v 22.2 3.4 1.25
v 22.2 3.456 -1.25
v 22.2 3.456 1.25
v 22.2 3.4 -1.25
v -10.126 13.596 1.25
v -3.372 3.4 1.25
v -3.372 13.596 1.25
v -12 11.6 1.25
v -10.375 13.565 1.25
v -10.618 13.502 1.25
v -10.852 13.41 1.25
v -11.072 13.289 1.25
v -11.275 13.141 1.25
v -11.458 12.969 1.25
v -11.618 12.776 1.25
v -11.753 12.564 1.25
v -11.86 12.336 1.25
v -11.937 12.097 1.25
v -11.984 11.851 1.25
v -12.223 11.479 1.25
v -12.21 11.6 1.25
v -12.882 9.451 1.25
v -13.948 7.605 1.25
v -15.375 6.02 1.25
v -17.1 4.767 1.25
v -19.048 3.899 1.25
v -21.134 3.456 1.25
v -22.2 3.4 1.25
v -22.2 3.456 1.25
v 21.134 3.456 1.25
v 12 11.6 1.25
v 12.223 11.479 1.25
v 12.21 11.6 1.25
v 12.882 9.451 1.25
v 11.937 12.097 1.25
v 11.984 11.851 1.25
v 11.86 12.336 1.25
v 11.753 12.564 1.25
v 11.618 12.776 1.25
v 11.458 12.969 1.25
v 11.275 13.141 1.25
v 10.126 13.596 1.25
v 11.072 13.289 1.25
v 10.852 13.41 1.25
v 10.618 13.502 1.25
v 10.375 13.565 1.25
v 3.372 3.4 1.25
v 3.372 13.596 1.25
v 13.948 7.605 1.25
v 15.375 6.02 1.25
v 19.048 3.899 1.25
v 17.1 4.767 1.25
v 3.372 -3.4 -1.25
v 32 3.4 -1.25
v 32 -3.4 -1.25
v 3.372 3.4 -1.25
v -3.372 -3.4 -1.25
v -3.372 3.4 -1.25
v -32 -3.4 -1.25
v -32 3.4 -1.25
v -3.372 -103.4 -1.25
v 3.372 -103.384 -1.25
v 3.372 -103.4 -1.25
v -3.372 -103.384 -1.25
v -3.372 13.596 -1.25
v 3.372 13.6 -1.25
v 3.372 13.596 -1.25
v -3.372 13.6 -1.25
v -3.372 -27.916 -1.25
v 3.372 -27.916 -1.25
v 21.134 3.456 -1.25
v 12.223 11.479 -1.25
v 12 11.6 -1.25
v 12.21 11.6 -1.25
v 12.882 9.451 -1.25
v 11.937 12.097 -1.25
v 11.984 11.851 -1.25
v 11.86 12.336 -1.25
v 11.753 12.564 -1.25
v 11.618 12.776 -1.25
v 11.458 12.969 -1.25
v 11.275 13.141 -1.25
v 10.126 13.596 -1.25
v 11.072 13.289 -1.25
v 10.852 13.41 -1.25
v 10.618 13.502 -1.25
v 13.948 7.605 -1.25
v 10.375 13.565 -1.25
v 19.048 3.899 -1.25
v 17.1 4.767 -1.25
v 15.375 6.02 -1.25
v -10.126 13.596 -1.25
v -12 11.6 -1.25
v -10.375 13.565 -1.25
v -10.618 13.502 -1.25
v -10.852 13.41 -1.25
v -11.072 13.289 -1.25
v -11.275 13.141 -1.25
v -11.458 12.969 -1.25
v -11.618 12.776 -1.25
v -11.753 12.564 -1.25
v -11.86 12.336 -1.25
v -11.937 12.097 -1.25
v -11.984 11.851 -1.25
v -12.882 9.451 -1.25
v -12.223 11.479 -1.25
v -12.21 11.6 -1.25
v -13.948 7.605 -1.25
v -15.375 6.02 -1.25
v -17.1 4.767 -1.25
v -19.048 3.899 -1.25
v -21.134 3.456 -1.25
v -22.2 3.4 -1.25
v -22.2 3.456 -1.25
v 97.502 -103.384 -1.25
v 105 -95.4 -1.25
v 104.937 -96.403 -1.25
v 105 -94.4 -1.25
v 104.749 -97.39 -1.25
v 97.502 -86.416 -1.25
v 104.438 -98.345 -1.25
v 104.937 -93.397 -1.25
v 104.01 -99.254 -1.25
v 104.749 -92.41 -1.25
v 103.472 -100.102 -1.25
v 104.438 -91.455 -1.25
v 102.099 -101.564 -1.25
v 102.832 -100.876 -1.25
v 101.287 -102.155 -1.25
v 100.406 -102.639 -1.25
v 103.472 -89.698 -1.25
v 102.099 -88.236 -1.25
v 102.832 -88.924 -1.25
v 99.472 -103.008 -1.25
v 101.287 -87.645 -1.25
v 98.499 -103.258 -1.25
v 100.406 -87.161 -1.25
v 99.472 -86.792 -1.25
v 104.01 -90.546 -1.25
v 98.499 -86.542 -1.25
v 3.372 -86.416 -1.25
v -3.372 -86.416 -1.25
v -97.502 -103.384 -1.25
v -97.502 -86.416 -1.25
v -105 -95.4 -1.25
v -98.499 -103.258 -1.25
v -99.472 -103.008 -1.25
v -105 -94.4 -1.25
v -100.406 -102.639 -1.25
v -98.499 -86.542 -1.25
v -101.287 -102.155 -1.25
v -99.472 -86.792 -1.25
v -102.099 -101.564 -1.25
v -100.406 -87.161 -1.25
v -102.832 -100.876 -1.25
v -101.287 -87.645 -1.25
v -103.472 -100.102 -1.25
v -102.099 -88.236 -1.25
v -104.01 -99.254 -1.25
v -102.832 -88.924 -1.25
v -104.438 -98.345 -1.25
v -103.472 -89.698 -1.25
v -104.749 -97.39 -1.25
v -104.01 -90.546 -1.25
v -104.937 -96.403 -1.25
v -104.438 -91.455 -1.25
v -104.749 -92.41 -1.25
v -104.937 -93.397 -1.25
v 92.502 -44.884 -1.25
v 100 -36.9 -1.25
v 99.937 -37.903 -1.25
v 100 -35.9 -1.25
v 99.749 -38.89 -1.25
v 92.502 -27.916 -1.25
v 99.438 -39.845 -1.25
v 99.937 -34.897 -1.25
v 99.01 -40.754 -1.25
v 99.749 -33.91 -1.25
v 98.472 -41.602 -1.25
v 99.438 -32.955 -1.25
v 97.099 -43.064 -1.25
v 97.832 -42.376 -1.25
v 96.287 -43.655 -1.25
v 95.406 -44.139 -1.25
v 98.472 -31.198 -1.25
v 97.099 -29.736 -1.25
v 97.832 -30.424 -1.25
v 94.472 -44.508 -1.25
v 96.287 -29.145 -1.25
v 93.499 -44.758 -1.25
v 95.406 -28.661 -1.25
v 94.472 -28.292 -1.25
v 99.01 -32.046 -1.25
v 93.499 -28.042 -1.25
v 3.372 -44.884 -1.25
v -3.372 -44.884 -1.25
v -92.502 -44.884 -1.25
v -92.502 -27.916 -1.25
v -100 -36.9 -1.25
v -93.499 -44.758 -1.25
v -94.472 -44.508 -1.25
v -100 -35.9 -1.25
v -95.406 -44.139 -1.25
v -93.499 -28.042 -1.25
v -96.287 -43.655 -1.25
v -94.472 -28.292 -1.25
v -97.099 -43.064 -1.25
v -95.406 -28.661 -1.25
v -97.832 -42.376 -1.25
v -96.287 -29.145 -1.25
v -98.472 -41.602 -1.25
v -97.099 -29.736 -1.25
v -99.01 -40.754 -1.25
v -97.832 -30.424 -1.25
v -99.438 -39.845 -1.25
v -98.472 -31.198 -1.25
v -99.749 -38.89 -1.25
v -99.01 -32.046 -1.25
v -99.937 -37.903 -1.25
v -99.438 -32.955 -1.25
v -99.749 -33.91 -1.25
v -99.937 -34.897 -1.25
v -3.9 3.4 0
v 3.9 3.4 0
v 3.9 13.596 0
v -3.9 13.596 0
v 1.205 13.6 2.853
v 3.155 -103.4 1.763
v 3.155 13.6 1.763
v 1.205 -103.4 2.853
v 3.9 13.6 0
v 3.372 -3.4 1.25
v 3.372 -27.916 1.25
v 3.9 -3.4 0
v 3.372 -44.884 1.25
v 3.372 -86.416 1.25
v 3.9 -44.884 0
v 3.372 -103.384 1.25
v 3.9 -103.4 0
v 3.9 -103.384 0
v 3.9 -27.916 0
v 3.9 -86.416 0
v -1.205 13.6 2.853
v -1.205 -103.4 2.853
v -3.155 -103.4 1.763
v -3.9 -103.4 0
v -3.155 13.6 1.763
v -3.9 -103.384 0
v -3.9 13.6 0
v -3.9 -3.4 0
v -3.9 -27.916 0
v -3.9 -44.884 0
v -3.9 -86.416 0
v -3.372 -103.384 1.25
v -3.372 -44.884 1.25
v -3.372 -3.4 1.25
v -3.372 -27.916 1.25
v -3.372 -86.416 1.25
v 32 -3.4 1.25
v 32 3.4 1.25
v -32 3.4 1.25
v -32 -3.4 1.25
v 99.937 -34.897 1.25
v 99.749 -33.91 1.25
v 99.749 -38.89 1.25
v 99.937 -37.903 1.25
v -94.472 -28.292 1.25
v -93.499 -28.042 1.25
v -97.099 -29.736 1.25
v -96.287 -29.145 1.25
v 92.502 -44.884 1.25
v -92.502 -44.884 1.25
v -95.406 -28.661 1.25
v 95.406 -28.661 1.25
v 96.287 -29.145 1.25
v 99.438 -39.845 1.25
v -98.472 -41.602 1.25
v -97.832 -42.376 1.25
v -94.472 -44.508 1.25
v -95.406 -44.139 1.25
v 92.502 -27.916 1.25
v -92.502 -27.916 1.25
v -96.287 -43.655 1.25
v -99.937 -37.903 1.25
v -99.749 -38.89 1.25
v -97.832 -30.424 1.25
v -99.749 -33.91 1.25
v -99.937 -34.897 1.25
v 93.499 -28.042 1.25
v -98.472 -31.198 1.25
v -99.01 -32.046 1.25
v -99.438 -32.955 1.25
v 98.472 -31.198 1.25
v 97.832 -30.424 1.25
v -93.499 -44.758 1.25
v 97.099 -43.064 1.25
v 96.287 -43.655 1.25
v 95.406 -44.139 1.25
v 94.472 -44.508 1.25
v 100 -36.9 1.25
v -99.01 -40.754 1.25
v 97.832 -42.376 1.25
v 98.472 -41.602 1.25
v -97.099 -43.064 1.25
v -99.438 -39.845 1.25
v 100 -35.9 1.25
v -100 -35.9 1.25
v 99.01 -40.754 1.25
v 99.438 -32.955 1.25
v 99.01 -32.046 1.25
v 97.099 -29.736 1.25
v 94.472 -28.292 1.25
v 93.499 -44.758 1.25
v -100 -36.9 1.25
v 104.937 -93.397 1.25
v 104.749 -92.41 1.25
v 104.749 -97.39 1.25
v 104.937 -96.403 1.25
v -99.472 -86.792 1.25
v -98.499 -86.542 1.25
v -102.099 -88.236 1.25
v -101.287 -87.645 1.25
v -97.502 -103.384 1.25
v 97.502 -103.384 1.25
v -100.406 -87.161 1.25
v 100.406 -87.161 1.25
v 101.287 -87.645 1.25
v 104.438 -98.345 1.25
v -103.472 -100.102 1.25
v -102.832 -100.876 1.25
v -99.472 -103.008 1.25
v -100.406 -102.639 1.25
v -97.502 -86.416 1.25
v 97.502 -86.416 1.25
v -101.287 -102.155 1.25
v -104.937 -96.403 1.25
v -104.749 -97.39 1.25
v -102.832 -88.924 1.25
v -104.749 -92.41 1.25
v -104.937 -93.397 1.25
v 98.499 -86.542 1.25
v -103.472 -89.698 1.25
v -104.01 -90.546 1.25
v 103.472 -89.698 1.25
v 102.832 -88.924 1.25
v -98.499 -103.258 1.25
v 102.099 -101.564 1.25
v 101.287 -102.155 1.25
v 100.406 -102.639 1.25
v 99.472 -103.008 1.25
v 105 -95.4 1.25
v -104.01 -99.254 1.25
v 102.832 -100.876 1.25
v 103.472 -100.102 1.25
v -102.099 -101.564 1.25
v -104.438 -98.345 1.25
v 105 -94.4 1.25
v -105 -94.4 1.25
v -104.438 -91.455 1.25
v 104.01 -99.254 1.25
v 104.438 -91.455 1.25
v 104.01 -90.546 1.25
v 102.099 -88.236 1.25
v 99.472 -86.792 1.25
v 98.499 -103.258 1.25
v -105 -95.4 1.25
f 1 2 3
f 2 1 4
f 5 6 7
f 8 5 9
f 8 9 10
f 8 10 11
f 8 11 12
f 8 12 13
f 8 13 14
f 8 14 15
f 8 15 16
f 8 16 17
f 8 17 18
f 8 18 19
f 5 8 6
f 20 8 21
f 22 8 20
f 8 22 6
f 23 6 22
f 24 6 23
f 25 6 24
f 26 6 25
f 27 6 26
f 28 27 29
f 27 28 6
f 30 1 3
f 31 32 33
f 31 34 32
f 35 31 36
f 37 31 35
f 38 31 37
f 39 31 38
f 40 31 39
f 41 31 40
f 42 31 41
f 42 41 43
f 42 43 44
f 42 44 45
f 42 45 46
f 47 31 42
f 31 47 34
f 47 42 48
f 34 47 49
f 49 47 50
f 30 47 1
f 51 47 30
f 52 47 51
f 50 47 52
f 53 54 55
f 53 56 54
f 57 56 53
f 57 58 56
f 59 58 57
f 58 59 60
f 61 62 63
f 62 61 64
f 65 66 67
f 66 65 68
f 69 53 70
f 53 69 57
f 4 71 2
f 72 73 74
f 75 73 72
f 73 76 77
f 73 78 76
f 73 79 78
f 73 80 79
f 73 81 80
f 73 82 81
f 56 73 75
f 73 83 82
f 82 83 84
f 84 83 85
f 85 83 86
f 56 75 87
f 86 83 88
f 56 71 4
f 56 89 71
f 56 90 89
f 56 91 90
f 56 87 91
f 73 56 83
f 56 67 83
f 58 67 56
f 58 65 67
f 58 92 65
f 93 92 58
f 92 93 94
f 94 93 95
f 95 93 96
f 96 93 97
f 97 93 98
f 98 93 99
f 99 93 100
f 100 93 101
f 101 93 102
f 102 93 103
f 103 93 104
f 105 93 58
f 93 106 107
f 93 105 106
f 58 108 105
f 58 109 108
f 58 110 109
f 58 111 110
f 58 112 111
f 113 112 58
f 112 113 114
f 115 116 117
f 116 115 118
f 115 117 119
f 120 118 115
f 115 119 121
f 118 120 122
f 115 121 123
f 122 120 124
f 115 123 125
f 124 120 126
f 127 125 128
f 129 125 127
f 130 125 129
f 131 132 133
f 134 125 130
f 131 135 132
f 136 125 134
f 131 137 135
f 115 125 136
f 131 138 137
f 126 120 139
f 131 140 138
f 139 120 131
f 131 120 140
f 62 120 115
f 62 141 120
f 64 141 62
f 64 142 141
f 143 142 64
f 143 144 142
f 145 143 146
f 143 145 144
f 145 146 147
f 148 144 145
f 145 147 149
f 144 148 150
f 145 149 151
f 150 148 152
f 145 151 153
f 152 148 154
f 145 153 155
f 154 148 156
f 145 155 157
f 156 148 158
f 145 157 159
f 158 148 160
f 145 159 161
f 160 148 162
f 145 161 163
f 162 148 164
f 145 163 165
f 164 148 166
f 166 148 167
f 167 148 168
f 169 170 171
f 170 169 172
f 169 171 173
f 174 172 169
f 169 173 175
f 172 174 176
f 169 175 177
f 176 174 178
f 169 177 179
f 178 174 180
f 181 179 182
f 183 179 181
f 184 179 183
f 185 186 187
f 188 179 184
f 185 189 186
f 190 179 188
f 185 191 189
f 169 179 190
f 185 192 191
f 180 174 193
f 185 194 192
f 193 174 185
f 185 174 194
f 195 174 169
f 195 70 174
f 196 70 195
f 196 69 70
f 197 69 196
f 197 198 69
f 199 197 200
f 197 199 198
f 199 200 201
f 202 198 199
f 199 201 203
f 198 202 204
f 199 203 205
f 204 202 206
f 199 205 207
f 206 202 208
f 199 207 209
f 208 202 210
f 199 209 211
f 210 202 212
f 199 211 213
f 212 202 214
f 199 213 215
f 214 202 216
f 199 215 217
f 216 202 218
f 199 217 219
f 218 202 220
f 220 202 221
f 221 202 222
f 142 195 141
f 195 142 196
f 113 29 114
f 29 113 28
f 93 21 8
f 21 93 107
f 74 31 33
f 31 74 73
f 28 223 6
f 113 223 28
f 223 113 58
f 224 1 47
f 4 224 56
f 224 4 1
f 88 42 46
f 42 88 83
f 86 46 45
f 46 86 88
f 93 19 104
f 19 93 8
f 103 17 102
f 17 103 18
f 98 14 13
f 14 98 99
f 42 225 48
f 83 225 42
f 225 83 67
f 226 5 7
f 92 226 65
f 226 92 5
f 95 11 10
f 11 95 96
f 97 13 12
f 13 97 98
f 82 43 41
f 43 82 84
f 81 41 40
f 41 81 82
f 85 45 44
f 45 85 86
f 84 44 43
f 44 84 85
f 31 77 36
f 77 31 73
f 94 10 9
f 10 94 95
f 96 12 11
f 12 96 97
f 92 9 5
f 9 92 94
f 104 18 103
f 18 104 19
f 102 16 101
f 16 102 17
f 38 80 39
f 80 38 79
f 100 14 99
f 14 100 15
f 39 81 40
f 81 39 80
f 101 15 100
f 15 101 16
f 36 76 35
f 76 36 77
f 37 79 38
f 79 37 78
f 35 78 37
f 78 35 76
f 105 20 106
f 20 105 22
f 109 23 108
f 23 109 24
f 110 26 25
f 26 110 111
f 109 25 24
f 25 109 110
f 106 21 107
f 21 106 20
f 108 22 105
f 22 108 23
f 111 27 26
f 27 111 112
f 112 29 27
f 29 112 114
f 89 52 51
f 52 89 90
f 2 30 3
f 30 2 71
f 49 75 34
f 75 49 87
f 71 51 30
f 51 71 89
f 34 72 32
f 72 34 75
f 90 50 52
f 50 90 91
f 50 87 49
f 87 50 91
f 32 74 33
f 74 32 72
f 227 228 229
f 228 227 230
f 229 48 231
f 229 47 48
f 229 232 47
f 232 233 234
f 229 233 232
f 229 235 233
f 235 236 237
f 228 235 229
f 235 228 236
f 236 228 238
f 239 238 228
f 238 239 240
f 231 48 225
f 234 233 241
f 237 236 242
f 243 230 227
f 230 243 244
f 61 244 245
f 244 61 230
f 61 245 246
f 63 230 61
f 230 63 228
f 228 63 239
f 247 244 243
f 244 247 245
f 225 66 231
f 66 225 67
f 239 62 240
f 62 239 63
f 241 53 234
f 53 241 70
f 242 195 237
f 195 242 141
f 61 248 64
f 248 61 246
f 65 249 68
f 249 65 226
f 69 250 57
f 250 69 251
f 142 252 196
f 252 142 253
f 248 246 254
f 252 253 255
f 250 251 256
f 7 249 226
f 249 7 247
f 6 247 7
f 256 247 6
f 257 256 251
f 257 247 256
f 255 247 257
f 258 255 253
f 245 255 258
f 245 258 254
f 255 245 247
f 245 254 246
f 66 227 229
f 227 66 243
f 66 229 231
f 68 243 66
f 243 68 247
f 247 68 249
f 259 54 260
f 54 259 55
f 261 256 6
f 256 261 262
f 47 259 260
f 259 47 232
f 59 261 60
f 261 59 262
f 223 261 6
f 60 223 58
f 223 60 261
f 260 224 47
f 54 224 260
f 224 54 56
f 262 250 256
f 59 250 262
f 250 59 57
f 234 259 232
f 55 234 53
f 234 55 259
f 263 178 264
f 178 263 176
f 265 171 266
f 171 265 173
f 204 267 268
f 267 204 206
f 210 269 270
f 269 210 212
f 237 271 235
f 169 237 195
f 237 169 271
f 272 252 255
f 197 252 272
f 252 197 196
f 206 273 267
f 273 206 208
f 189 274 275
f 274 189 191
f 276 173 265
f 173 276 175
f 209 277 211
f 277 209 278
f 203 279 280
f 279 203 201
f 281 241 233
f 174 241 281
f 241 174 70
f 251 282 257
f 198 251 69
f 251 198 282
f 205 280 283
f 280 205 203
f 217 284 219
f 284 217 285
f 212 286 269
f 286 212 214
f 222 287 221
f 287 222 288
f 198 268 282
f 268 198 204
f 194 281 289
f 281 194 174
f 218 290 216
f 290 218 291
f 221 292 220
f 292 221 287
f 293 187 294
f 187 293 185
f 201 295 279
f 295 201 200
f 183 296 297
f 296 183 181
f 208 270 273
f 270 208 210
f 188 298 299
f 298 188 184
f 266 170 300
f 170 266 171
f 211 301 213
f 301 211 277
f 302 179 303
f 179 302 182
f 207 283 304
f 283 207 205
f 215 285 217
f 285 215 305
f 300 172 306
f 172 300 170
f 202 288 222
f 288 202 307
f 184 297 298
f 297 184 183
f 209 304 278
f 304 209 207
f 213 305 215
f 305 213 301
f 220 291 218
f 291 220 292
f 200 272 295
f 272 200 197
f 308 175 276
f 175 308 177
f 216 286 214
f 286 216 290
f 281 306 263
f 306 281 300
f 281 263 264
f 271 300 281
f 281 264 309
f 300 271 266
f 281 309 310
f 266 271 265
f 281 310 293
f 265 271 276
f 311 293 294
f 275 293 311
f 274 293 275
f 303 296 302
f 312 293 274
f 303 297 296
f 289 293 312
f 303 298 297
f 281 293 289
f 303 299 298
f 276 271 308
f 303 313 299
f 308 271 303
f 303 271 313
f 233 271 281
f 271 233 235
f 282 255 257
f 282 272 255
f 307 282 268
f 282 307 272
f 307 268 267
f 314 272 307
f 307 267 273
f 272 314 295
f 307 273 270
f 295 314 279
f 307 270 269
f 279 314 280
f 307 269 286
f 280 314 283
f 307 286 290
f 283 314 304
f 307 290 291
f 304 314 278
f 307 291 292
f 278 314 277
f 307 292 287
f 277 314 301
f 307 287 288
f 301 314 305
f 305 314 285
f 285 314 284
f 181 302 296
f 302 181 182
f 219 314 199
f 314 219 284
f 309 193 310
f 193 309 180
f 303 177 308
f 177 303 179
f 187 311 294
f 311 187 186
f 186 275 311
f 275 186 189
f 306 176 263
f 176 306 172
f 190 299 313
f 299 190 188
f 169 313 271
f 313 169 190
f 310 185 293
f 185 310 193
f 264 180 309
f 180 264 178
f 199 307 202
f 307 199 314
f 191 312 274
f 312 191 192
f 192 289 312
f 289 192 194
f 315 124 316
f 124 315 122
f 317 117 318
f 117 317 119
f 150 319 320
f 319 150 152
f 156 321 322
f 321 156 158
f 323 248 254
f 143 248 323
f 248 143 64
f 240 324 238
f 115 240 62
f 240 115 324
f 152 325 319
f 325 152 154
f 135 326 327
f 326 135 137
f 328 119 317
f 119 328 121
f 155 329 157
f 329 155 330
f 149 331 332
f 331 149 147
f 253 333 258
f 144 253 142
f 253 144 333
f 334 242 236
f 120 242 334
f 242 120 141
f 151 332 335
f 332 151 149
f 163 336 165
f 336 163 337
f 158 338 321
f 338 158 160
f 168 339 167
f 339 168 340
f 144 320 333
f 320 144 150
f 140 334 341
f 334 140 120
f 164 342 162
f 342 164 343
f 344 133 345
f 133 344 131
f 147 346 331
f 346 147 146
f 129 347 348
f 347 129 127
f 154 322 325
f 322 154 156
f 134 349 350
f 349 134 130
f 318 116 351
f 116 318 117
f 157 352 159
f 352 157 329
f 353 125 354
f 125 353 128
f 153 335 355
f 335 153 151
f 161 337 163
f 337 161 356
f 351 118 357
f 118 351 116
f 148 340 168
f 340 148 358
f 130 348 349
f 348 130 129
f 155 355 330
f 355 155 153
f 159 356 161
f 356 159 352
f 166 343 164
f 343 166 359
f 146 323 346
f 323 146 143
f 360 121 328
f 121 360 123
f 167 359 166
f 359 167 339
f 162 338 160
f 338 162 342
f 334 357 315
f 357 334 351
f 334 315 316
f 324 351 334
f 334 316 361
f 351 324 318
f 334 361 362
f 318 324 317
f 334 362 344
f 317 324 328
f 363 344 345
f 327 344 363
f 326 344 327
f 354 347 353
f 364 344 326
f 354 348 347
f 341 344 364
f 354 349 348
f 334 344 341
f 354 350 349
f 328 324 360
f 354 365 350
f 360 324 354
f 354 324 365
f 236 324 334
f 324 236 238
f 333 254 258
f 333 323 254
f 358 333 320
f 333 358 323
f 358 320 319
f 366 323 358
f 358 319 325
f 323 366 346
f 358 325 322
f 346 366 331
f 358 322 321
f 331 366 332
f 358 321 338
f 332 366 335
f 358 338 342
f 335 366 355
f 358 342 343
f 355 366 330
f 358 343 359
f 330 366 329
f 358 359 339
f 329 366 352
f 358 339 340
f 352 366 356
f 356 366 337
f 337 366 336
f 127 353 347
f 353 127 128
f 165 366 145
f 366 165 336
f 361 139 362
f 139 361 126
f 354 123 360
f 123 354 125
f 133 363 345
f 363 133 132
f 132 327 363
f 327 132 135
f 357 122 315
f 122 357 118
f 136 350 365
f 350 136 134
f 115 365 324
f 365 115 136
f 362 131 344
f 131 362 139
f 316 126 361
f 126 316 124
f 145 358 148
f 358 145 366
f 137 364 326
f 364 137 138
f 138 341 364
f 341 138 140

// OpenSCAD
/* [Parameters] */
tip_perimeter=64;
tip_width=17;

mid_perimeter=200;
mid_width=17;

bottom_perimeter=210;
bottom_width=17;

distance_tip_mid=24.5;
distance_mid_bottom=41.5;

thickness=2.5;

/* [Hidden] */
e=thickness;
r=8;
r2=2;
tfp=tip_perimeter;
tfw=tip_width;

mp=mid_perimeter;
mw=mid_width;

bp=bottom_perimeter;
bw=bottom_width;

dtm=distance_tip_mid;
dmb=distance_mid_bottom;

//modulos
module cubox(l1,w1,e1,r1){
hull(){
translate([l1/2-r1,w1/2-r1,0]){
cylinder(e1,r1,r1,$fn=50, center=true);
}
translate([l1/2-r1,-w1/2+r1,0]){
cylinder(e1,r1,r1,$fn=50, center=true);
}
translate([-l1/2+r1,-w1/2+r1,0]){
cylinder(e1,r1,r1,$fn=50, center=true);
}
translate([-l1/2+r1,w1/2-r1,0]){
cylinder(e1,r1,r1,$fn=50, center=true);

}
}
}


//TIP
cube(size=[tfp,tfw*0.4,e] , center=true);

difference() {
translate([0,tfw*0.5-r2/2,0]){
union(){
cube(size=[tfp*0.375+2*tfw*0.6,tfw*0.6-r2,e] , center=true);
translate([0,r2/2,0]){
cubox(tfp*0.375,tfw*0.6,e  ,r2);
}
}
}
    union() {
    translate([-(tfp*0.375/2+tfw*0.6),tfw*0.8,0]){
    cylinder(e+2,tfw*0.6,tfw*0.6, center=true);
    }
   translate([tfp*0.375/2+tfw*0.6,tfw*0.8,0]){
    cylinder(e+2,tfw*0.6,tfw*0.6, center=true);
    } 
    }

}

//MIDDLE
dtm2=dtm+0.4*tfw/2+mw/2;
translate([0,-dtm2,0]){  
cubox(mp,mw,e,r);
}

//BOTTOM
dmb2=dmb+bw/2+mw/2;
translate([0,-dtm2-dmb2,0]){  
cubox(bp,bw,e,r);
}

//union
cl=tfw+dtm+mw+dmb+bw;
translate([0,-cl/2+tfw*0.8,0]){
difference() { 
rotate([90,0,0]){ 
scale([1.3,1,1]){
cylinder(cl,3,3, center=true);
}
}
translate([0,0,-(10+e)/2]){ 
cube(size=[10,cl+10,10] , center=true);
}
}
}
